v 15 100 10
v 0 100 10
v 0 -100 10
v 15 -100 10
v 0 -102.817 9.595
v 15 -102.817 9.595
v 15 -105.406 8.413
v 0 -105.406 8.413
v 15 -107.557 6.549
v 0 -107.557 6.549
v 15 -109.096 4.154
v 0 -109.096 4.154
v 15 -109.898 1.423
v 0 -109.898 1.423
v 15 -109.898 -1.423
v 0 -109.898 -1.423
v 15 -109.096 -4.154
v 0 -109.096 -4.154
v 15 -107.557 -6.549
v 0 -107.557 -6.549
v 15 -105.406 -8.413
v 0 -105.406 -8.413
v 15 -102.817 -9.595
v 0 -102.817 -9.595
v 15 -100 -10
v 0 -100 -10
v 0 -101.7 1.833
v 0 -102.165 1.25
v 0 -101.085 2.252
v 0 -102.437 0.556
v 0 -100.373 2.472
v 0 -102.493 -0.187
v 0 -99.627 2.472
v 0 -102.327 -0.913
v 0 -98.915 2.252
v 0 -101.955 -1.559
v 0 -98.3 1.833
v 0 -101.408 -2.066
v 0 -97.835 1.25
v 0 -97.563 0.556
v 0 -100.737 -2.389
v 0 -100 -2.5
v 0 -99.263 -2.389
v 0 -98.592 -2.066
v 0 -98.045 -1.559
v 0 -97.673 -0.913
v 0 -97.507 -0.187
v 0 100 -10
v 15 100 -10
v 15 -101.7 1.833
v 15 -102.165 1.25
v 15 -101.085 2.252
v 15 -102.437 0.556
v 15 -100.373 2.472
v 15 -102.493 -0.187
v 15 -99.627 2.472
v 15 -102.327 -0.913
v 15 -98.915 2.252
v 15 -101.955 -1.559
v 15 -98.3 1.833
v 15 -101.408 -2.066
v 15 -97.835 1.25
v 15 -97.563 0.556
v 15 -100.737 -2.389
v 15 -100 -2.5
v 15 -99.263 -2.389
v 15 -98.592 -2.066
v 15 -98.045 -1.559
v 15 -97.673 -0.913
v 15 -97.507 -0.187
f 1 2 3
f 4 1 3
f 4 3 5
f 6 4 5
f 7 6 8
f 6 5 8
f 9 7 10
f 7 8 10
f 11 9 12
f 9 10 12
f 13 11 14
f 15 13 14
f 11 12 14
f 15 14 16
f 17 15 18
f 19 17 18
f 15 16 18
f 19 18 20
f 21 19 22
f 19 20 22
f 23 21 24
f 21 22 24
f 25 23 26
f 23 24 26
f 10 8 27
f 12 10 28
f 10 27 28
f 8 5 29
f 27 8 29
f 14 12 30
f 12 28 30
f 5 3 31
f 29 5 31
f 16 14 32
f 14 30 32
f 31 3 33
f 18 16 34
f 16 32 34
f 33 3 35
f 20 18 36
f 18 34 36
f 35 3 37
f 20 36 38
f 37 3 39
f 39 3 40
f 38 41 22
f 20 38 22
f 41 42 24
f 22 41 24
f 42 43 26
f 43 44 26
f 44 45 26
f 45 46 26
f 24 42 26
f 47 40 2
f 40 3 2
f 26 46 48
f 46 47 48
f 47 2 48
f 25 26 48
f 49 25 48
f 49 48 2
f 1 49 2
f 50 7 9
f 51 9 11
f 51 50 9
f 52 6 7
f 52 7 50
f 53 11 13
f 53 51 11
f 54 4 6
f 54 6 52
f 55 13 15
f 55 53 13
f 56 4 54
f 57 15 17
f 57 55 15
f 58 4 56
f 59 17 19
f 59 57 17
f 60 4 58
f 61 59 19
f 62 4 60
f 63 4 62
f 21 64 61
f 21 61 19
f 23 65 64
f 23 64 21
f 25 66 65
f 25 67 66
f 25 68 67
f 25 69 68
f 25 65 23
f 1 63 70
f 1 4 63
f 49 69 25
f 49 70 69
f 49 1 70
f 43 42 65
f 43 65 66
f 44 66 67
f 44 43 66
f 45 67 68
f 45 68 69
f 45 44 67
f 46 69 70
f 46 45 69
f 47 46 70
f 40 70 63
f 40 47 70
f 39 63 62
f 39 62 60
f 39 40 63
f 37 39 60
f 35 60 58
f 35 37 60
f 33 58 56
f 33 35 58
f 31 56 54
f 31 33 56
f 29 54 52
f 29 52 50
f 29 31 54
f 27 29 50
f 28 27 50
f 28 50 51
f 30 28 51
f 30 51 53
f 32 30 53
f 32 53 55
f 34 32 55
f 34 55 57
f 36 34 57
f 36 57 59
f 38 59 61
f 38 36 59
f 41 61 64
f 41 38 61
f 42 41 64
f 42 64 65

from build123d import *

# Parameters (mm, degrees)
ESQUISSE3_R = 2.5
BASE_DEPTH  = 15


with BuildPart() as part:
    # Esquisse3 → BASE (new body)
    with BuildSketch(Plane(origin=(0, 0, 0), x_dir=(0, 0, -1), z_dir=(1, 0, 0))):
        with BuildLine():
            Line((10, 100), (-10, 100))
            Line((-10, 100), (-10, -100))
            ThreePointArc((-10, -100), (0, -110), (10, -100))
            Line((10, -100), (10, 100))
        make_face()
        with Locations((0, -100)):
            Circle(ESQUISSE3_R, mode=Mode.SUBTRACT)
    extrude(amount=BASE_DEPTH)


solid = part.part
